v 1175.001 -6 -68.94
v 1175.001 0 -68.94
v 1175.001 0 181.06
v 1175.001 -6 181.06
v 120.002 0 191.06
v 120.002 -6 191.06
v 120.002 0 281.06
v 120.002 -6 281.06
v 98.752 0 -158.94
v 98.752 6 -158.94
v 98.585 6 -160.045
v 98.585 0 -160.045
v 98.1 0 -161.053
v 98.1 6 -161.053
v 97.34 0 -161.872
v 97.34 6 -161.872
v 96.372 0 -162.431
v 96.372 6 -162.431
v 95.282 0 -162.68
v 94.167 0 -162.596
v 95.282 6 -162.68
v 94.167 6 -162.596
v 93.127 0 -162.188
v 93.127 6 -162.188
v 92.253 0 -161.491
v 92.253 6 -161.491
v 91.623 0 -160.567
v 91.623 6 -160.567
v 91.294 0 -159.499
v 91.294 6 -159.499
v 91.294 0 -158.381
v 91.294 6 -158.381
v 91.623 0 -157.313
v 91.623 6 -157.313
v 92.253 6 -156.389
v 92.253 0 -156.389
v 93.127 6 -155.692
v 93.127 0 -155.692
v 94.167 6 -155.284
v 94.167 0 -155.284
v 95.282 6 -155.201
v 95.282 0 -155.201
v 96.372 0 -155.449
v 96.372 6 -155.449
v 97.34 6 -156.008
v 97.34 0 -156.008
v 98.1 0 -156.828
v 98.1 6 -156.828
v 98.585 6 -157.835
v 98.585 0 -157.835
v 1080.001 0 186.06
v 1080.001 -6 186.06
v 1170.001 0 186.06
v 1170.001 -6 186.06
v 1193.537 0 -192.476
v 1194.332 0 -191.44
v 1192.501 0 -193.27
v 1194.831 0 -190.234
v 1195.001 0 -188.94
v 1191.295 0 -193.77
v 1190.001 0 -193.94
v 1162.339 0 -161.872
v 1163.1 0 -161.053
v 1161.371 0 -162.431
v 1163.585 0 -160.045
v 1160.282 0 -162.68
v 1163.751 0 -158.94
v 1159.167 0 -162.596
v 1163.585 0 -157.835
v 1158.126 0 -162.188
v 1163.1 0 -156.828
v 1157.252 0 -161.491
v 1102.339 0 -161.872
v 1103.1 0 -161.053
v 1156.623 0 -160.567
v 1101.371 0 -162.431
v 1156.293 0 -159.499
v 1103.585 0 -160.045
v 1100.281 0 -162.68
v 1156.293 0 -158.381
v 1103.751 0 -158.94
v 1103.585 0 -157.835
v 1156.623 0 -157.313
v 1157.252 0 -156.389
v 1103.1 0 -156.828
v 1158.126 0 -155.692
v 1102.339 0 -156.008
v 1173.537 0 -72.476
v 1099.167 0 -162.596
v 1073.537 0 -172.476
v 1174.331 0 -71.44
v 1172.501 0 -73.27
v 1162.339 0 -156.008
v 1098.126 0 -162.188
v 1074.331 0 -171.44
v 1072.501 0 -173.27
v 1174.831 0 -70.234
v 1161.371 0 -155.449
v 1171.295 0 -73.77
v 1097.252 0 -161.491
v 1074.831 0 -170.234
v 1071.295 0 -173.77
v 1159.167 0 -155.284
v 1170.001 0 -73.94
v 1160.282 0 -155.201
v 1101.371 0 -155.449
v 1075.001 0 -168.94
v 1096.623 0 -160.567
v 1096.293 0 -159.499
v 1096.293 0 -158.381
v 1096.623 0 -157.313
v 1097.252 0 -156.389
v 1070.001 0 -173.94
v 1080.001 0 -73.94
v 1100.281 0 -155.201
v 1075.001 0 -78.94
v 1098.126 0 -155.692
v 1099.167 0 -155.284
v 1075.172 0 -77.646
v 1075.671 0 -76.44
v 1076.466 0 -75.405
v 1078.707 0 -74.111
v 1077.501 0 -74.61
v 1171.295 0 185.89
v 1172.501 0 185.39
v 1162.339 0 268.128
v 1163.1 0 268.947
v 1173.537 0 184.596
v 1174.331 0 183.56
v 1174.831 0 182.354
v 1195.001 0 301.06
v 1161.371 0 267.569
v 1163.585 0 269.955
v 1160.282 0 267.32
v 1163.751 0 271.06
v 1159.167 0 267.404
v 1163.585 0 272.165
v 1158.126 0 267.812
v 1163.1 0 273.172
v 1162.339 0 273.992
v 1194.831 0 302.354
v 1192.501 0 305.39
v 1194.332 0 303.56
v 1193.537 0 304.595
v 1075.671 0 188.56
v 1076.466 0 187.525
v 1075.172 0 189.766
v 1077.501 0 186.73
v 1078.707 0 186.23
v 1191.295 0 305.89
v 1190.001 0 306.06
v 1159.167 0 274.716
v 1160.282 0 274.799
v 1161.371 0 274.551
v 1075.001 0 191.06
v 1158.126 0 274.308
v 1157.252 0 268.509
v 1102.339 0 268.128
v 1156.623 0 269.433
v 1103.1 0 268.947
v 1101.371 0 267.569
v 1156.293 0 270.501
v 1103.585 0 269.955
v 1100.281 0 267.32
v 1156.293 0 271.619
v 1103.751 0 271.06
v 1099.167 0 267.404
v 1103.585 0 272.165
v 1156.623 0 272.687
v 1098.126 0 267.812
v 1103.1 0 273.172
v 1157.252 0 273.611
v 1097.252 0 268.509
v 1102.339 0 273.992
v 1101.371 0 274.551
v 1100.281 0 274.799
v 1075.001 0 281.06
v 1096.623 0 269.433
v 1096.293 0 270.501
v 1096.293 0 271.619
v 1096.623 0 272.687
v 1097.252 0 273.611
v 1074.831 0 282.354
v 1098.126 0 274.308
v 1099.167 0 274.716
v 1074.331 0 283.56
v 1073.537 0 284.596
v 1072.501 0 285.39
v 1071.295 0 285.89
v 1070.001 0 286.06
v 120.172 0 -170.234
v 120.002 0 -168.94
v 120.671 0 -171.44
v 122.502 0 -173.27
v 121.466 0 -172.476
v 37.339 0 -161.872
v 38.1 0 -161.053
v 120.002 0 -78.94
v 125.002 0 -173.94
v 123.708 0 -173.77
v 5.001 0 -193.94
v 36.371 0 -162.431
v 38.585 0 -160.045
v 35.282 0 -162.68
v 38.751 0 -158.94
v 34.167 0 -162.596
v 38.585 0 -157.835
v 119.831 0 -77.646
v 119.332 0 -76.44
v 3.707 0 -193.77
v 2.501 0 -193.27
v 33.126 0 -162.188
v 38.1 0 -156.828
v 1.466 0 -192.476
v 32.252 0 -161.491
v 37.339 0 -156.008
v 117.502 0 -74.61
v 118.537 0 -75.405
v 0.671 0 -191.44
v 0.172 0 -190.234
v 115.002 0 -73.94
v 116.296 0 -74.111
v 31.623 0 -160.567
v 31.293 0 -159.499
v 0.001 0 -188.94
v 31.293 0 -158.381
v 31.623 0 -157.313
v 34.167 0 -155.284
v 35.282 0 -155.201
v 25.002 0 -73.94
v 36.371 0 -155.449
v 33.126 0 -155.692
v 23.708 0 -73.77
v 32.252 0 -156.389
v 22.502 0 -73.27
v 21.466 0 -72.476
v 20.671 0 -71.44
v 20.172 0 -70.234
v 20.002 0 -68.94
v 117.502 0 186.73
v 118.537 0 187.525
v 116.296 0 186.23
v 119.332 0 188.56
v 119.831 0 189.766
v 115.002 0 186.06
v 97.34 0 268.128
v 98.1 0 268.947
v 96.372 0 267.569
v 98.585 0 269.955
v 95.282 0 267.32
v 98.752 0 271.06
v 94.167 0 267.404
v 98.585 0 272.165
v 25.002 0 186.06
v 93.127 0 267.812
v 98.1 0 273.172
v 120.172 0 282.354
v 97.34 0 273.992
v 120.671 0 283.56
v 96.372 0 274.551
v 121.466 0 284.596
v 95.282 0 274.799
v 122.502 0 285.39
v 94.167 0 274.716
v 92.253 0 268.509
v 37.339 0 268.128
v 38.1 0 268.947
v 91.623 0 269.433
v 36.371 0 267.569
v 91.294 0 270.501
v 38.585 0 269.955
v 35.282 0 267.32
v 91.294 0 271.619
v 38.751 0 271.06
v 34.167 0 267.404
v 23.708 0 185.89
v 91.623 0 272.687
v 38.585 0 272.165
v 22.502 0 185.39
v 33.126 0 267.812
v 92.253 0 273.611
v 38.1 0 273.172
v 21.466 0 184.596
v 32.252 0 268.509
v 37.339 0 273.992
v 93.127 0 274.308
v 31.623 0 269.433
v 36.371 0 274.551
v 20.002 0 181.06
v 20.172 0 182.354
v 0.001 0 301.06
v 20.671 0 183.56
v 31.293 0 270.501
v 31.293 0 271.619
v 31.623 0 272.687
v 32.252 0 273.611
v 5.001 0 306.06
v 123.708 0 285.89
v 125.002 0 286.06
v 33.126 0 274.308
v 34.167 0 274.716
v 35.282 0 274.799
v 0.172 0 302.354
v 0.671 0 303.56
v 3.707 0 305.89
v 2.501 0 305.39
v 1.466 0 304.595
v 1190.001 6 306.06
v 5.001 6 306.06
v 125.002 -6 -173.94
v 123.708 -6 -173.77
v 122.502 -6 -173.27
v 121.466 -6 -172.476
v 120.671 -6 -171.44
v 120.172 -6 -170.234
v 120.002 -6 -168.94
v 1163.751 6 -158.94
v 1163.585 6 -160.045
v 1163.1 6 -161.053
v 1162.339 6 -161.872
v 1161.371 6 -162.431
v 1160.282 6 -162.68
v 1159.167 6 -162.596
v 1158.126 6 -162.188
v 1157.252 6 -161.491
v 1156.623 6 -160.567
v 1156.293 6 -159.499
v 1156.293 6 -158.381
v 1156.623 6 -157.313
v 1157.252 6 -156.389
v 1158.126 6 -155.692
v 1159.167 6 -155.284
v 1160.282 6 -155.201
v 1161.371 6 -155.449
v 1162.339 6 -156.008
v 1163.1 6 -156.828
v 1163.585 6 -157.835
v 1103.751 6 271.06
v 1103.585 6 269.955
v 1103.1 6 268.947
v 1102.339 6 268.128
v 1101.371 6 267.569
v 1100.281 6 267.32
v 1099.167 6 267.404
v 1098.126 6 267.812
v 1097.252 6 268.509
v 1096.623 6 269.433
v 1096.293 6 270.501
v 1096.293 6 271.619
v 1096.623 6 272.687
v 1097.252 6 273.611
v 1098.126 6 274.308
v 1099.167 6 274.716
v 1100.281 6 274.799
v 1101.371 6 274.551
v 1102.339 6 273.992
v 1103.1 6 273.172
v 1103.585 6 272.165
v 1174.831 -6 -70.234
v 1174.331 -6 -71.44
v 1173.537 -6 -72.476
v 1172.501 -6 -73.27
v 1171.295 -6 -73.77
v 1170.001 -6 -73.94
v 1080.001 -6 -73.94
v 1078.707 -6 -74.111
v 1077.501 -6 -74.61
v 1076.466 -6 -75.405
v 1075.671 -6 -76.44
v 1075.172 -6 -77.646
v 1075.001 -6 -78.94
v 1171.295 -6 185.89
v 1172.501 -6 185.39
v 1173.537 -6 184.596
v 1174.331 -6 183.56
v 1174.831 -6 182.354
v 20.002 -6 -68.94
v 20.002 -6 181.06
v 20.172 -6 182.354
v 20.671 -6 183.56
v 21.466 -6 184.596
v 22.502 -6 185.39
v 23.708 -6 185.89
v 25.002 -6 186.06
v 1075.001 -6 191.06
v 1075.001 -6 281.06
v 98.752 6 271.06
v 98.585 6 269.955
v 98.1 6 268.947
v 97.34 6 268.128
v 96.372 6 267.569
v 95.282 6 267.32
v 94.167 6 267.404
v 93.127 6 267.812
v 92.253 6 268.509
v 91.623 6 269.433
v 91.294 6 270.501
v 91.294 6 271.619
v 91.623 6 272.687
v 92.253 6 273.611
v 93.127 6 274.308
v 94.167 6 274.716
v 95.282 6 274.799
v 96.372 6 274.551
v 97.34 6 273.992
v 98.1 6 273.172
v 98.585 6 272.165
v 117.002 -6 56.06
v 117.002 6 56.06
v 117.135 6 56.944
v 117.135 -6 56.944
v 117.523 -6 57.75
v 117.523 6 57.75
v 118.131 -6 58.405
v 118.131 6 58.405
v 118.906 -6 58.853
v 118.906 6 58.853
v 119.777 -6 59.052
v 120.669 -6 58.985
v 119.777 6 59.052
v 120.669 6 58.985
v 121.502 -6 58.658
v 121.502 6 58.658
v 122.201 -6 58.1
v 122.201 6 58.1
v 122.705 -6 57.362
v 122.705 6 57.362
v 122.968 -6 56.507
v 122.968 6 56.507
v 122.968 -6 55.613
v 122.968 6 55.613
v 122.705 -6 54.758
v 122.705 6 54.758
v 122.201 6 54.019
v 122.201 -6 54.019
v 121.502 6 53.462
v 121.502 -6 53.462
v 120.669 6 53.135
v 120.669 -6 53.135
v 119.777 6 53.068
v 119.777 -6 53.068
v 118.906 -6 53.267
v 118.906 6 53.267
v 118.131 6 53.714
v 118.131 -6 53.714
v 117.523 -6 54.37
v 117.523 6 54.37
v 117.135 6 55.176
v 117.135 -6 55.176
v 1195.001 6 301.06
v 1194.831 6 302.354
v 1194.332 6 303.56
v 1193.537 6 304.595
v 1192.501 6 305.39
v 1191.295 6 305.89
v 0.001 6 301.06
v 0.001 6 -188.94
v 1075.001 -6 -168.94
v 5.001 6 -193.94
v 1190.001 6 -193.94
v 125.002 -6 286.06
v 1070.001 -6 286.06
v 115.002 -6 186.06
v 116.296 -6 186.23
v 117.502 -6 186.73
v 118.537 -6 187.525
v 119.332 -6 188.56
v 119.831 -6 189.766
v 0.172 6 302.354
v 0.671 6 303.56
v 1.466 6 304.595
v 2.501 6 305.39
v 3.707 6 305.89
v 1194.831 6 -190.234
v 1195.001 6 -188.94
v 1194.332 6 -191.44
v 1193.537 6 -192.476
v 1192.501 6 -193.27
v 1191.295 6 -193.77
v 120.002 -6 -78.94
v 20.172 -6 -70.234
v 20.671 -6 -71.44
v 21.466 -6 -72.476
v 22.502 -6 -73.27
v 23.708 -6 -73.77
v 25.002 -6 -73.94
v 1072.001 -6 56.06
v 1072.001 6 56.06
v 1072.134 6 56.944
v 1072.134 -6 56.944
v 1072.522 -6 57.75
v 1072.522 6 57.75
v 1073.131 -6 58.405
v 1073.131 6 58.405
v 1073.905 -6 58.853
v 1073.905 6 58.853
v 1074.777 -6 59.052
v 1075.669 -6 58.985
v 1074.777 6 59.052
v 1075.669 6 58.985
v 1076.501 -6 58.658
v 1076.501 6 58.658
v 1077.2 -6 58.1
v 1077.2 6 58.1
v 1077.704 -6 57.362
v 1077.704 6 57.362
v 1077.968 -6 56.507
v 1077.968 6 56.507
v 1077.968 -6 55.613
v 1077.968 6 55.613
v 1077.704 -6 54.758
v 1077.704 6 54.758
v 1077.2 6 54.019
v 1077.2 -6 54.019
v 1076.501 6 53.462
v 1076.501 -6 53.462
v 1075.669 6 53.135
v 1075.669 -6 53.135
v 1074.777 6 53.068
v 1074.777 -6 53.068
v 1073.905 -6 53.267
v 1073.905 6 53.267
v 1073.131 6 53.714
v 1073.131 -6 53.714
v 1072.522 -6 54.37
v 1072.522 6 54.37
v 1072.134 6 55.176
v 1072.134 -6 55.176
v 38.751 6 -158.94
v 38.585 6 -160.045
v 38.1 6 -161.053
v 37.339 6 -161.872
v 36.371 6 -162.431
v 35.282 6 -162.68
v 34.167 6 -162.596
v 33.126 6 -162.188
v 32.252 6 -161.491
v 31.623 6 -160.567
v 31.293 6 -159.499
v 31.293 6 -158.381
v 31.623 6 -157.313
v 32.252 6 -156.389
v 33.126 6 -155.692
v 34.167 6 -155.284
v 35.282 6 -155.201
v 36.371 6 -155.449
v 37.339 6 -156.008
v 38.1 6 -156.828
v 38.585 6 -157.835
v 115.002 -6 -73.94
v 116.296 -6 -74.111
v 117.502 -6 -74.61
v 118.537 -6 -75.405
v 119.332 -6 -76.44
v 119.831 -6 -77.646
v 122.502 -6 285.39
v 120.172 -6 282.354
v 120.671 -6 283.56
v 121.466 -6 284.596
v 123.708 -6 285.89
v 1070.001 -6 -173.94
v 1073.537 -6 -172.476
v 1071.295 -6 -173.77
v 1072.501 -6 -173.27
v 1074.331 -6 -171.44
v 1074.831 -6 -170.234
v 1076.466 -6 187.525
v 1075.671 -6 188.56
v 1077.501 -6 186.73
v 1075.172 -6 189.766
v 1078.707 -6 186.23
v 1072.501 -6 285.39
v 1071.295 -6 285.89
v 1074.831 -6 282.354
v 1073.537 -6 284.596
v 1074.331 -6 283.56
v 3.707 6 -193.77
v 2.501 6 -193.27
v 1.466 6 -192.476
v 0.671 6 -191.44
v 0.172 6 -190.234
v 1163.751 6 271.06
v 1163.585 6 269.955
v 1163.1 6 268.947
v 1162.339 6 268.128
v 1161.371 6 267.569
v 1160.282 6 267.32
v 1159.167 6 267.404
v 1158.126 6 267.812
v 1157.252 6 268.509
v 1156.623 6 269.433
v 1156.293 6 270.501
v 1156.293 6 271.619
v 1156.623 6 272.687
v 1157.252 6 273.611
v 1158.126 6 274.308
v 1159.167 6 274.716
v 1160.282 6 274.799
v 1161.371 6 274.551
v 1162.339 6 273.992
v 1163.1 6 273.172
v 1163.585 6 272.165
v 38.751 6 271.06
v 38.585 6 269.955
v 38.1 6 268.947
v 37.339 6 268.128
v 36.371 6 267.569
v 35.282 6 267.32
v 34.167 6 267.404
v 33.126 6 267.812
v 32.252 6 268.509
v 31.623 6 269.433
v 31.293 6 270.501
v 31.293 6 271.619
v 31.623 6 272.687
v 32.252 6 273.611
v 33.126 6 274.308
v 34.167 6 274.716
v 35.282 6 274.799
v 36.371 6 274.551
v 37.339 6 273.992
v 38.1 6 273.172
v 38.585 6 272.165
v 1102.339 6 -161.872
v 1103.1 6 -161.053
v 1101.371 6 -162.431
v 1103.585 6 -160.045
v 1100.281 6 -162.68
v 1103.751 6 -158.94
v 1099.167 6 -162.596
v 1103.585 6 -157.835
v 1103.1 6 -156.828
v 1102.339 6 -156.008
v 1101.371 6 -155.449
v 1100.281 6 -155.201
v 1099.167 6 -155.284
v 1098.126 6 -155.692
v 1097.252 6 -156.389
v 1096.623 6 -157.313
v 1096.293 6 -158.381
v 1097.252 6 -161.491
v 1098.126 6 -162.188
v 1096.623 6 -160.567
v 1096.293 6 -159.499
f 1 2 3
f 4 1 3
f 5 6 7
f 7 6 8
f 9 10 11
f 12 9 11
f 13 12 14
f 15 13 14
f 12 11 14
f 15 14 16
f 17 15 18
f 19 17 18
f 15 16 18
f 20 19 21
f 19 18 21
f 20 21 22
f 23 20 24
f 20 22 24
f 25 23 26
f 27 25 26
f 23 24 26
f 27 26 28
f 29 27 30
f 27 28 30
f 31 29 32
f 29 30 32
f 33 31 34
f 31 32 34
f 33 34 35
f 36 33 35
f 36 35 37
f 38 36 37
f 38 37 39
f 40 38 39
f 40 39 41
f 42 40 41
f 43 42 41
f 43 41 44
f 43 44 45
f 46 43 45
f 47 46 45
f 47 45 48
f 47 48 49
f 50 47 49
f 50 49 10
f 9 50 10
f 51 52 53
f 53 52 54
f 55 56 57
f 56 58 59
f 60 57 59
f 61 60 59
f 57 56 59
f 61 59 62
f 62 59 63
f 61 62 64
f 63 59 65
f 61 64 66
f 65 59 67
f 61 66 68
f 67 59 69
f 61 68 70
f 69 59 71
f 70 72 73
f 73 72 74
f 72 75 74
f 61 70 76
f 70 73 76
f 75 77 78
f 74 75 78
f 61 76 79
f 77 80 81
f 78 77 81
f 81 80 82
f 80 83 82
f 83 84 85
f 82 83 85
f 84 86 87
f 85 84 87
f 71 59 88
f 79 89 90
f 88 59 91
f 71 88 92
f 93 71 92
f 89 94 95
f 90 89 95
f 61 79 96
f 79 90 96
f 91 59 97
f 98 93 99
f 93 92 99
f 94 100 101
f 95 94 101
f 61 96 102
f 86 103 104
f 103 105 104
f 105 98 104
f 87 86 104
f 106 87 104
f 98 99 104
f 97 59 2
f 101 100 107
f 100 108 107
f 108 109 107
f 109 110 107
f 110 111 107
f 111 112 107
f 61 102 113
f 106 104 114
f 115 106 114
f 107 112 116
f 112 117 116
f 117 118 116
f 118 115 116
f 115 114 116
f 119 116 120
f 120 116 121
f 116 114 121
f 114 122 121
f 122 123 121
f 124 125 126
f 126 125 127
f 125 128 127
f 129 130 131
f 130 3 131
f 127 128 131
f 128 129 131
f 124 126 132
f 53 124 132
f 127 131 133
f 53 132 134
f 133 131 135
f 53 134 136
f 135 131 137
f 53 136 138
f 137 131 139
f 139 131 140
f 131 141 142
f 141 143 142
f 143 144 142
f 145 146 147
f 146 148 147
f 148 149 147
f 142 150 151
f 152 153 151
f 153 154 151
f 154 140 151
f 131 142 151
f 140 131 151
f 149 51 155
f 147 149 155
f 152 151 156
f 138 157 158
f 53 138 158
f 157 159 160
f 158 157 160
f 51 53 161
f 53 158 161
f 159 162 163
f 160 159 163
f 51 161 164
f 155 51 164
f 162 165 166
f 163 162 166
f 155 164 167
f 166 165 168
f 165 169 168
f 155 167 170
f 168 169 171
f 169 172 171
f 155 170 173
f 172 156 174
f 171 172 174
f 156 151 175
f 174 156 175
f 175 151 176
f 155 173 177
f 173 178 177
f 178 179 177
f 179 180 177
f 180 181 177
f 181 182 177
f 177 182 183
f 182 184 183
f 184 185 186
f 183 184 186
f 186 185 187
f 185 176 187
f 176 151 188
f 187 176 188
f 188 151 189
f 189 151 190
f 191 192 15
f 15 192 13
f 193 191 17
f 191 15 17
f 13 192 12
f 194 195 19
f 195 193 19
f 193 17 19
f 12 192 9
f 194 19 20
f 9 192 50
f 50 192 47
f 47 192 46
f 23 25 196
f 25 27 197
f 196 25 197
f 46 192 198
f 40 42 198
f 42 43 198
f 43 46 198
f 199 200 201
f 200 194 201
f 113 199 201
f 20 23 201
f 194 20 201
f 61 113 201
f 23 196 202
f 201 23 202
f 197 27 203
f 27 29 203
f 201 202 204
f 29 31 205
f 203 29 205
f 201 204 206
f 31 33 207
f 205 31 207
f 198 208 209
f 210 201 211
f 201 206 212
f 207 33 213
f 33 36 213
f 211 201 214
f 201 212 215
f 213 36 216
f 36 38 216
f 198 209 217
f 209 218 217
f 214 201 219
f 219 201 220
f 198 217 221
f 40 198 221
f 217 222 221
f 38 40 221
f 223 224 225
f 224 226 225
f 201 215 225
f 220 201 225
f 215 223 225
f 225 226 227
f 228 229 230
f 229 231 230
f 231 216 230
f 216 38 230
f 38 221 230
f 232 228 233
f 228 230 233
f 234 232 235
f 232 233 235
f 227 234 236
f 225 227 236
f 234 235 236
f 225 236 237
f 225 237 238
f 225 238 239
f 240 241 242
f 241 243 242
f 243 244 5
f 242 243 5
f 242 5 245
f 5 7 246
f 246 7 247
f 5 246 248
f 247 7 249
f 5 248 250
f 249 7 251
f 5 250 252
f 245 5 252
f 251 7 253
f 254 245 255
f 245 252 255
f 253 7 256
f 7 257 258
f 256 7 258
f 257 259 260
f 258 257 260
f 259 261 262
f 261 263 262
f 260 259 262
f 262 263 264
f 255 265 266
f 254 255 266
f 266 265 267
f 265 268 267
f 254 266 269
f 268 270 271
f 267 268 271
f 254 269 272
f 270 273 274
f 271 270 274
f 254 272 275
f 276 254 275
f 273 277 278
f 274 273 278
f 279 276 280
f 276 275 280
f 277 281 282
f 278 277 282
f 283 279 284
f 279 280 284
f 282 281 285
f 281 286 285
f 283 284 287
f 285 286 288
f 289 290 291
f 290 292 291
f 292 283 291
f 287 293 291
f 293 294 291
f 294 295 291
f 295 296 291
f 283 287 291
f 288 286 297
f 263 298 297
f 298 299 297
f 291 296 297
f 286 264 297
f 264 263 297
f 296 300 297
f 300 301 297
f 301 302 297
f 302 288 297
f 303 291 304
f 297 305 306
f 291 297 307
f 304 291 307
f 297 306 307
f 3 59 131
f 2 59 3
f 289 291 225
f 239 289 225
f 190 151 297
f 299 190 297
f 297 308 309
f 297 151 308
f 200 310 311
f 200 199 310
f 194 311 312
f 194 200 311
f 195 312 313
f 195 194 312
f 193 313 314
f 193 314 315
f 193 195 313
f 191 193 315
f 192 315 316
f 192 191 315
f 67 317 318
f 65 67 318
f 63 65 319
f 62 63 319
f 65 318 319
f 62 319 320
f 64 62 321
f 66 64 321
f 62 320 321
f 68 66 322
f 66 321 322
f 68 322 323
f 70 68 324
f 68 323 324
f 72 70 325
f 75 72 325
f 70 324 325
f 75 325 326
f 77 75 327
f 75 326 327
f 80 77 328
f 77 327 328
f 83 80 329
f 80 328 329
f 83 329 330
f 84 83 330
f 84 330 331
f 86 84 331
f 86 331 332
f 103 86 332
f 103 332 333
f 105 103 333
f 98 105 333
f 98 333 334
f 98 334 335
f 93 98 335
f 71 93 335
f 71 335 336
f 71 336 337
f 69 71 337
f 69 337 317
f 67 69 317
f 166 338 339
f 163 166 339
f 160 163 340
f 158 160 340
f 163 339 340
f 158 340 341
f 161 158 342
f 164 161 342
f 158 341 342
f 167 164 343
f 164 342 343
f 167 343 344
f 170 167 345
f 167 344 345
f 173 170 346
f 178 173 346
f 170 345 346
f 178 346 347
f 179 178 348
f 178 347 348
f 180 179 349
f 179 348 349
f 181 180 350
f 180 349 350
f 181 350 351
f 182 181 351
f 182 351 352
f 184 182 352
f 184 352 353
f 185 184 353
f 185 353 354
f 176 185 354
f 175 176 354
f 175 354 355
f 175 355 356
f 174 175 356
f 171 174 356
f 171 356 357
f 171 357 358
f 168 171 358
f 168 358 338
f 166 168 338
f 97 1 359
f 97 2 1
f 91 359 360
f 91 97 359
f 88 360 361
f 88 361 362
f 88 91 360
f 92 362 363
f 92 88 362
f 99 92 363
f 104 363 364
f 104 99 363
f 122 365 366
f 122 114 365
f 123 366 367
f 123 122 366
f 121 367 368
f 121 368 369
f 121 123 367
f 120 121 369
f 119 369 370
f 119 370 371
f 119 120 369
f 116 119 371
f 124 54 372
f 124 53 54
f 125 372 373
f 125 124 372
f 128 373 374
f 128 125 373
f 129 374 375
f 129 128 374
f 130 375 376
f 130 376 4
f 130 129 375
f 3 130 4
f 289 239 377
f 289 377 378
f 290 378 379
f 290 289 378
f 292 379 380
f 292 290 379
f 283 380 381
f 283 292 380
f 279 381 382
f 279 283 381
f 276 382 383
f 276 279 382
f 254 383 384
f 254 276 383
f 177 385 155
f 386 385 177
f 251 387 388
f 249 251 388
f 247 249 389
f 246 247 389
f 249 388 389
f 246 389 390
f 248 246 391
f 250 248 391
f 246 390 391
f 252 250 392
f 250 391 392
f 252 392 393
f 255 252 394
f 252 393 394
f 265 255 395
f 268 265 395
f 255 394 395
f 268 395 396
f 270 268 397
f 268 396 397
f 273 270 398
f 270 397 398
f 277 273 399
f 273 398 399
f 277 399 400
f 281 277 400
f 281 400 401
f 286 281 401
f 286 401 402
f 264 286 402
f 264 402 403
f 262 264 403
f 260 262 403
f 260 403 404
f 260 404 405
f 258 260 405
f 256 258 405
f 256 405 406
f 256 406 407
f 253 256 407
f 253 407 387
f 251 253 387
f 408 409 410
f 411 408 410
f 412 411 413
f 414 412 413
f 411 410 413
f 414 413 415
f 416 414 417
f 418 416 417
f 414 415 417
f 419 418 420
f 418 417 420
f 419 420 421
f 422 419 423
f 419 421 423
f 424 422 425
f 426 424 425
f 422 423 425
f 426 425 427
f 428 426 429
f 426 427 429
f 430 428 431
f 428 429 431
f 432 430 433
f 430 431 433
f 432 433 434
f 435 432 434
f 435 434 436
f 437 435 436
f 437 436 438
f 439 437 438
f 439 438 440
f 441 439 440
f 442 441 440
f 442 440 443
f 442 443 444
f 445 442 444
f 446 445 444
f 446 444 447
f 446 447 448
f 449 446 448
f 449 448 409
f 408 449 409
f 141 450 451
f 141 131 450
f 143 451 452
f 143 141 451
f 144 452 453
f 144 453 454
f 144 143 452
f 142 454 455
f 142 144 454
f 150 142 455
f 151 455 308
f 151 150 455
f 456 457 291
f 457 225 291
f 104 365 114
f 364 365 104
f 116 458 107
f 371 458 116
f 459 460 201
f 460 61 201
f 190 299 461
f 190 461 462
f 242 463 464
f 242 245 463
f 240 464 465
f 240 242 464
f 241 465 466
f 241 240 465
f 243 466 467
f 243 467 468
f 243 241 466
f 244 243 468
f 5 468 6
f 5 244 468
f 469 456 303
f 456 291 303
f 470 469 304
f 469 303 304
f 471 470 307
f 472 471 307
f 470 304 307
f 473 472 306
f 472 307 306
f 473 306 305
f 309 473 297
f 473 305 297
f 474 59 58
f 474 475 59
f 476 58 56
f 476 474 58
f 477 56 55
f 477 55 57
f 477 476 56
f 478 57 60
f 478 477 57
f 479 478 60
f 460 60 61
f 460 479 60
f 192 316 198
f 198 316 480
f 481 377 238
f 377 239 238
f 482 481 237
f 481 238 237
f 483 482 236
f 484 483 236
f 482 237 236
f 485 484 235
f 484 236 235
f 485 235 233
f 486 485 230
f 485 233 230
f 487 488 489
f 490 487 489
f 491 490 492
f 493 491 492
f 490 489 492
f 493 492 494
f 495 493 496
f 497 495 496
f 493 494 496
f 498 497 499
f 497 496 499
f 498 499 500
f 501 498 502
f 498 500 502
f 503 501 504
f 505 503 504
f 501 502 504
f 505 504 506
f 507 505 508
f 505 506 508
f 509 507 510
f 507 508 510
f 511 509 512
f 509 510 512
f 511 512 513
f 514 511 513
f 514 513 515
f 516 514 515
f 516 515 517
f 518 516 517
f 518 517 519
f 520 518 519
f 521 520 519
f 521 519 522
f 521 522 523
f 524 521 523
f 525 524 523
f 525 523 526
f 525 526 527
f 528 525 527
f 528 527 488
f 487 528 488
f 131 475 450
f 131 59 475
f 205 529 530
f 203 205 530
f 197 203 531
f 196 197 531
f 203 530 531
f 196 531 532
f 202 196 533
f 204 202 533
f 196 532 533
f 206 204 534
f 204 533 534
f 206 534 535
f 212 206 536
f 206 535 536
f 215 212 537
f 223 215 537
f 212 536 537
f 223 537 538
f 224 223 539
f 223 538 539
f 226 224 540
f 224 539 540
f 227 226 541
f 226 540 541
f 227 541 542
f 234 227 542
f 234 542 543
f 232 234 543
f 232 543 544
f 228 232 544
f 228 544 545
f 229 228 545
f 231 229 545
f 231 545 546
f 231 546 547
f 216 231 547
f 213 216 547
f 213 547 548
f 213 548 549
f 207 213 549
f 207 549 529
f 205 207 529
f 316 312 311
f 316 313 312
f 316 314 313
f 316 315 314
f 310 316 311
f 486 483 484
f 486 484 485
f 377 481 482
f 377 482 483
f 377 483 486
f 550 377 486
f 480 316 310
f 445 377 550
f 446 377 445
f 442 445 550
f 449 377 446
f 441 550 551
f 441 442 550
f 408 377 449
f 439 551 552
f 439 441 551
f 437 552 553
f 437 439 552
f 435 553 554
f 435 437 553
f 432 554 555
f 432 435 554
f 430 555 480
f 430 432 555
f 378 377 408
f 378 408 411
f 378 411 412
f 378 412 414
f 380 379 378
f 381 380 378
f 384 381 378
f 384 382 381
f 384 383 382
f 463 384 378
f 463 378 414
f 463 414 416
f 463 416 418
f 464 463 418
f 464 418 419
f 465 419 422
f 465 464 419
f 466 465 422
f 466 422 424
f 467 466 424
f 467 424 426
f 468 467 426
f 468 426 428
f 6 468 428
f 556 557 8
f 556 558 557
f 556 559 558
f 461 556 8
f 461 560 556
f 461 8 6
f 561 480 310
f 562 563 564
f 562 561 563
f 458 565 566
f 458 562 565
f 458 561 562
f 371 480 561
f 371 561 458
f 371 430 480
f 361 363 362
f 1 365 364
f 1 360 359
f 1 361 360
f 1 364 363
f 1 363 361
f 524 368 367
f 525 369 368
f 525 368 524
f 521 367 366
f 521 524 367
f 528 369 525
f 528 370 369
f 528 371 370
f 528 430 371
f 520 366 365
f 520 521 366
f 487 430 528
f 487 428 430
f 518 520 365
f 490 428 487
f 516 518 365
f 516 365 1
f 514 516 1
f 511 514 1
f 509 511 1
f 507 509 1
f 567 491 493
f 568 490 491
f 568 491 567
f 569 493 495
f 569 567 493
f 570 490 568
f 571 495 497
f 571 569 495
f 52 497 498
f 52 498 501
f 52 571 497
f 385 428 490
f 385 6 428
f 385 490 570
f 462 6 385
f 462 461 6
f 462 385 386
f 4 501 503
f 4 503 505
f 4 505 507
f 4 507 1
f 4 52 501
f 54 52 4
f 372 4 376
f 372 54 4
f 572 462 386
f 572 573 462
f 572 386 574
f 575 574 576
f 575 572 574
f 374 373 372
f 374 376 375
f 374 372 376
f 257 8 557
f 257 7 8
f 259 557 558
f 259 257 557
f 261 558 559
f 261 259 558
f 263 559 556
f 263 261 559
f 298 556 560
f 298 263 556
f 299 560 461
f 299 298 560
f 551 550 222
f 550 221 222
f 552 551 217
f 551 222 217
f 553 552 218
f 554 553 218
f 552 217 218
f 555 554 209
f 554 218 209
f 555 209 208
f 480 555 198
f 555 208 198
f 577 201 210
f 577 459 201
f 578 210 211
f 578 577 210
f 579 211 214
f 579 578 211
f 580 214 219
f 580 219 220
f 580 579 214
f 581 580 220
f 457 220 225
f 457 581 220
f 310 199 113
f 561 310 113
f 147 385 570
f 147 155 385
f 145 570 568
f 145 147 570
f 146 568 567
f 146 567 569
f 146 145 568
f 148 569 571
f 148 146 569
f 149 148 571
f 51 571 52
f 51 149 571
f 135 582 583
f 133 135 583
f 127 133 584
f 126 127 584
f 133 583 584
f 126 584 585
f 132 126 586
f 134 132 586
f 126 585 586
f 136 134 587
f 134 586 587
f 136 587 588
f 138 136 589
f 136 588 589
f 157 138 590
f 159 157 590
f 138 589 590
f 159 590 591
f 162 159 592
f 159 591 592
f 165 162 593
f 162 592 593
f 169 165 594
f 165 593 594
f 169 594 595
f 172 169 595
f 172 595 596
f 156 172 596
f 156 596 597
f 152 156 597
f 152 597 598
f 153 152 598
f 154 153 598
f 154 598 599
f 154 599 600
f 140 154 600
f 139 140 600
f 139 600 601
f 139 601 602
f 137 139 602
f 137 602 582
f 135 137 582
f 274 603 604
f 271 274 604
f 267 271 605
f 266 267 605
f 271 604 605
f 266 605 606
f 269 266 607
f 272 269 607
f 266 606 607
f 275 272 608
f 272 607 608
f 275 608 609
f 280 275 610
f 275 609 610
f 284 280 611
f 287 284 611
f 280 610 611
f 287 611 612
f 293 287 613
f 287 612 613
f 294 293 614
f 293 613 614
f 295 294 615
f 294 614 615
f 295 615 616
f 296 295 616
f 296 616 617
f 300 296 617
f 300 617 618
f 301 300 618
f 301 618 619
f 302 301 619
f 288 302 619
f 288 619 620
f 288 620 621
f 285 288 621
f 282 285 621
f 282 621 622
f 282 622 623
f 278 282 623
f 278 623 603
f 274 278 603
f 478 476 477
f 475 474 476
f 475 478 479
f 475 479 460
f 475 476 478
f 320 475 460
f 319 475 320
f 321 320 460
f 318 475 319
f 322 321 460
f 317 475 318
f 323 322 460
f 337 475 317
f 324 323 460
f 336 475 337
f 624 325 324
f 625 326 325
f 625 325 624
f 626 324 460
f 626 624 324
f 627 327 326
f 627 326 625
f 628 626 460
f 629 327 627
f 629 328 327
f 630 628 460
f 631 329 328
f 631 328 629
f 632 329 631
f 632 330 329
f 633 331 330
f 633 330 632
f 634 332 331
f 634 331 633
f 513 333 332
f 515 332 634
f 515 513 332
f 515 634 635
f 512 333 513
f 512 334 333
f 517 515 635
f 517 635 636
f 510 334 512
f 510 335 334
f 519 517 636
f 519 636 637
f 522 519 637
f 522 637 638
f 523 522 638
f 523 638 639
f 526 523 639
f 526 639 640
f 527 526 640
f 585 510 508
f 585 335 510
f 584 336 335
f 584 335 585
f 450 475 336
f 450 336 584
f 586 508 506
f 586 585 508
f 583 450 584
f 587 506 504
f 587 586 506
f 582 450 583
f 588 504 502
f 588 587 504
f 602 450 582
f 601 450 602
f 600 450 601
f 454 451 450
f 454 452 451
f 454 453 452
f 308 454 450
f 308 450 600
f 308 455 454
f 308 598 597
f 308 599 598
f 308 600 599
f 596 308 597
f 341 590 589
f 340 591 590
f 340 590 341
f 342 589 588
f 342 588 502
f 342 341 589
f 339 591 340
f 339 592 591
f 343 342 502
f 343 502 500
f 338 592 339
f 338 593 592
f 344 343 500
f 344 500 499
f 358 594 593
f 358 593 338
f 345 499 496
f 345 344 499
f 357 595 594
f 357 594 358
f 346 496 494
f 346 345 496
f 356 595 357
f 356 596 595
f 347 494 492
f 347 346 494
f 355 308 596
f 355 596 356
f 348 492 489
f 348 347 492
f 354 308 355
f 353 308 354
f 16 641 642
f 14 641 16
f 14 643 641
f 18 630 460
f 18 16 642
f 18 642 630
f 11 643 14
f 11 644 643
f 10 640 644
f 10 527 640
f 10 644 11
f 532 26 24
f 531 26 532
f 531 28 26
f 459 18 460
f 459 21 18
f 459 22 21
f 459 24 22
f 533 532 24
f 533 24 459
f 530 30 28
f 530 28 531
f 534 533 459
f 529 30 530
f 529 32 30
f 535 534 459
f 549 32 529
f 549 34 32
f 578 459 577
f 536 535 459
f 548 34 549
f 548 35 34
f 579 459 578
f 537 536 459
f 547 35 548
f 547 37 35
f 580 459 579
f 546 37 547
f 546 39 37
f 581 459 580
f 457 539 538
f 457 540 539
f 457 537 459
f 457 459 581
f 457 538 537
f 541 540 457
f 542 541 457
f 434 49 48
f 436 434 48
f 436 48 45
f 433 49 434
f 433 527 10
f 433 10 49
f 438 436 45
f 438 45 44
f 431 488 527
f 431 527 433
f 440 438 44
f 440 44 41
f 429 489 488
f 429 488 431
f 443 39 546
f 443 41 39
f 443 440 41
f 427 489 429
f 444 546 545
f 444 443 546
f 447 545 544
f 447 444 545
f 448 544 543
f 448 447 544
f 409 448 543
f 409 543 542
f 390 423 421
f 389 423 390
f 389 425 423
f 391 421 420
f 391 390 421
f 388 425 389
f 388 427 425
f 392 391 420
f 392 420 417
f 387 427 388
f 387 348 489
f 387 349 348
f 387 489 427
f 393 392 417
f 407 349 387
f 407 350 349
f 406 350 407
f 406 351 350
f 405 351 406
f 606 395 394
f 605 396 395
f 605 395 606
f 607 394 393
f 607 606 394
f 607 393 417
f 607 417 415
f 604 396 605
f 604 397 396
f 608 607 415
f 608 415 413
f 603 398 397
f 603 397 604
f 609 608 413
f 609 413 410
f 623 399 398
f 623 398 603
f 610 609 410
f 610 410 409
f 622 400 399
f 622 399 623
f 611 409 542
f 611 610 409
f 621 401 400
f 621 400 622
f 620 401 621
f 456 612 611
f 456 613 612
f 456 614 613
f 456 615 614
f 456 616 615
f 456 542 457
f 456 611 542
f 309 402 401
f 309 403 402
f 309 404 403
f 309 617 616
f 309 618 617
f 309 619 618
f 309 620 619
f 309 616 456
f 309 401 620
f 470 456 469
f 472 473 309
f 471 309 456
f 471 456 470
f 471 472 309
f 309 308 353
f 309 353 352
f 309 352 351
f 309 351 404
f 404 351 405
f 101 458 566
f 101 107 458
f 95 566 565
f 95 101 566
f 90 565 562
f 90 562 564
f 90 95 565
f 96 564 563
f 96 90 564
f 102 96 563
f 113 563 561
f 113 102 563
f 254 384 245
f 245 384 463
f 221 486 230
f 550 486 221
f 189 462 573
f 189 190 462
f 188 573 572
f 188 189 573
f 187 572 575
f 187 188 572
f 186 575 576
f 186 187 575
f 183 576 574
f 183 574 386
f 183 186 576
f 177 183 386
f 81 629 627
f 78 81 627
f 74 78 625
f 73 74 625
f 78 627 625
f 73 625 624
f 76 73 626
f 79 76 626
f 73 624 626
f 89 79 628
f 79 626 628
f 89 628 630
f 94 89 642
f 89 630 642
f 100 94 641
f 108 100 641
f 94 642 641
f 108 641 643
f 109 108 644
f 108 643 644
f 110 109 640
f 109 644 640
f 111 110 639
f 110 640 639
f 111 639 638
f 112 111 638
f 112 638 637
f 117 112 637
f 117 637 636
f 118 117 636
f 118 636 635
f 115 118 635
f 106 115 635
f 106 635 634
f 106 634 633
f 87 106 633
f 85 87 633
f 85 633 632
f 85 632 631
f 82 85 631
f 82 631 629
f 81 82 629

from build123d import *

# Parameters (mm, degrees)
F0_W     = 1154.9995206296
F0_H     = 460.000410676
F1_DEPTH = 6
F2_W     = 100
F2_H     = 100
F3_DEPTH = 6
F4_R     = 5
F5_W     = 1195
F5_H     = 500
F6_DEPTH = 3
F7_W     = 1195
F7_H     = 500
F8_DEPTH = 3
F9_R     = 5
F10_D    = 7.5
F12_D    = 6


with BuildPart() as f1:
    # F0 (on Front) → F1 (new body)
    with BuildSketch(Plane.XZ):
        with Locations((597.5013840944, 56.0599192977)):
            Rectangle(F0_W, F0_H)
    extrude(amount=F1_DEPTH)

    # F2 (on face) → F3 (cut)
    with BuildSketch(Plane.XZ.offset(6)):
        with Locations((70.0016237795, 236.0601246357)):
            Rectangle(F2_W, F2_H)
        with Locations((1125.0011444092, -123.9402860403)):
            Rectangle(F2_W, F2_H)
        with Locations((1125.0011444092, 236.0601246357)):
            Rectangle(F2_W, F2_H)
        with Locations((70.0016237795, -123.9402860403)):
            Rectangle(F2_W, F2_H)
    extrude(amount=-F3_DEPTH, mode=Mode.SUBTRACT)

    # F4
    f4_edges = [f1.edges().sort_by_distance(p)[0] for p in [
        (120.001624, -3, 286.060125),
        (120.001624, -3, 186.060125),
        (20.001624, -3, 186.060125),
        (20.001624, -3, -73.940286),
        (120.001624, -3, -73.940286),
        (120.001624, -3, -173.940286),
        (1075.001144, -3, -173.940286),
        (1075.001144, -3, -73.940286),
        (1175.001144, -3, -73.940286),
        (1175.001144, -3, 186.060125),
        (1075.001144, -3, 186.060125),
        (1075.001144, -3, 286.060125),
    ]]
    fillet(f4_edges, radius=F4_R)

    # F5 (on face) → F6 (join)
    with BuildSketch(Plane(origin=(0, 0, 0), x_dir=(-1, 0, 0), z_dir=(0, 1, 0))):
        with Locations((-597.5013840944, 56.0599192977)):
            Rectangle(F5_W, F5_H)
    extrude(amount=F6_DEPTH)

    # F7 (on face) → F8 (join)
    with BuildSketch(Plane(origin=(0, 3, 0), x_dir=(-1, 0, 0), z_dir=(0, 1, 0))):
        with Locations((-597.5013840944, 56.0599192977)):
            Rectangle(F7_W, F7_H)
    extrude(amount=F8_DEPTH)

    # F9
    f9_edges = [f1.edges().sort_by_distance(p)[0] for p in [
        (0.001384, 3, 306.059919),
        (0.001384, 3, -193.940081),
        (1195.001384, 3, -193.940081),
        (1195.001384, 3, 306.059919),
    ]]
    fillet(f9_edges, radius=F9_R)

    # F10 (through all)
    with Locations(Plane(origin=(0, 0, 0), x_dir=(-1, 0, 0), z_dir=(0, -1, 0))):
        with Locations((-35.0013840944, -271.0599192977), (-95.0016237795, -271.0599192977), (-35.0013840944, 158.9400807023), (-95.0016237795, 158.9400807023), (-1100.0011444092, -271.0599192977), (-1160.0013840944, -271.0599192977), (-1160.0013840944, 158.9400807023), (-1100.0011444092, 158.9400807023)):
            Hole(F10_D / 2)

    # F12 (through all)
    with Locations(Plane.XZ.offset(6)):
        with Locations((120.0016237795, 56.0599192977), (1075.0011444092, 56.0599192977)):
            Hole(F12_D / 2)


solid = f1.part
